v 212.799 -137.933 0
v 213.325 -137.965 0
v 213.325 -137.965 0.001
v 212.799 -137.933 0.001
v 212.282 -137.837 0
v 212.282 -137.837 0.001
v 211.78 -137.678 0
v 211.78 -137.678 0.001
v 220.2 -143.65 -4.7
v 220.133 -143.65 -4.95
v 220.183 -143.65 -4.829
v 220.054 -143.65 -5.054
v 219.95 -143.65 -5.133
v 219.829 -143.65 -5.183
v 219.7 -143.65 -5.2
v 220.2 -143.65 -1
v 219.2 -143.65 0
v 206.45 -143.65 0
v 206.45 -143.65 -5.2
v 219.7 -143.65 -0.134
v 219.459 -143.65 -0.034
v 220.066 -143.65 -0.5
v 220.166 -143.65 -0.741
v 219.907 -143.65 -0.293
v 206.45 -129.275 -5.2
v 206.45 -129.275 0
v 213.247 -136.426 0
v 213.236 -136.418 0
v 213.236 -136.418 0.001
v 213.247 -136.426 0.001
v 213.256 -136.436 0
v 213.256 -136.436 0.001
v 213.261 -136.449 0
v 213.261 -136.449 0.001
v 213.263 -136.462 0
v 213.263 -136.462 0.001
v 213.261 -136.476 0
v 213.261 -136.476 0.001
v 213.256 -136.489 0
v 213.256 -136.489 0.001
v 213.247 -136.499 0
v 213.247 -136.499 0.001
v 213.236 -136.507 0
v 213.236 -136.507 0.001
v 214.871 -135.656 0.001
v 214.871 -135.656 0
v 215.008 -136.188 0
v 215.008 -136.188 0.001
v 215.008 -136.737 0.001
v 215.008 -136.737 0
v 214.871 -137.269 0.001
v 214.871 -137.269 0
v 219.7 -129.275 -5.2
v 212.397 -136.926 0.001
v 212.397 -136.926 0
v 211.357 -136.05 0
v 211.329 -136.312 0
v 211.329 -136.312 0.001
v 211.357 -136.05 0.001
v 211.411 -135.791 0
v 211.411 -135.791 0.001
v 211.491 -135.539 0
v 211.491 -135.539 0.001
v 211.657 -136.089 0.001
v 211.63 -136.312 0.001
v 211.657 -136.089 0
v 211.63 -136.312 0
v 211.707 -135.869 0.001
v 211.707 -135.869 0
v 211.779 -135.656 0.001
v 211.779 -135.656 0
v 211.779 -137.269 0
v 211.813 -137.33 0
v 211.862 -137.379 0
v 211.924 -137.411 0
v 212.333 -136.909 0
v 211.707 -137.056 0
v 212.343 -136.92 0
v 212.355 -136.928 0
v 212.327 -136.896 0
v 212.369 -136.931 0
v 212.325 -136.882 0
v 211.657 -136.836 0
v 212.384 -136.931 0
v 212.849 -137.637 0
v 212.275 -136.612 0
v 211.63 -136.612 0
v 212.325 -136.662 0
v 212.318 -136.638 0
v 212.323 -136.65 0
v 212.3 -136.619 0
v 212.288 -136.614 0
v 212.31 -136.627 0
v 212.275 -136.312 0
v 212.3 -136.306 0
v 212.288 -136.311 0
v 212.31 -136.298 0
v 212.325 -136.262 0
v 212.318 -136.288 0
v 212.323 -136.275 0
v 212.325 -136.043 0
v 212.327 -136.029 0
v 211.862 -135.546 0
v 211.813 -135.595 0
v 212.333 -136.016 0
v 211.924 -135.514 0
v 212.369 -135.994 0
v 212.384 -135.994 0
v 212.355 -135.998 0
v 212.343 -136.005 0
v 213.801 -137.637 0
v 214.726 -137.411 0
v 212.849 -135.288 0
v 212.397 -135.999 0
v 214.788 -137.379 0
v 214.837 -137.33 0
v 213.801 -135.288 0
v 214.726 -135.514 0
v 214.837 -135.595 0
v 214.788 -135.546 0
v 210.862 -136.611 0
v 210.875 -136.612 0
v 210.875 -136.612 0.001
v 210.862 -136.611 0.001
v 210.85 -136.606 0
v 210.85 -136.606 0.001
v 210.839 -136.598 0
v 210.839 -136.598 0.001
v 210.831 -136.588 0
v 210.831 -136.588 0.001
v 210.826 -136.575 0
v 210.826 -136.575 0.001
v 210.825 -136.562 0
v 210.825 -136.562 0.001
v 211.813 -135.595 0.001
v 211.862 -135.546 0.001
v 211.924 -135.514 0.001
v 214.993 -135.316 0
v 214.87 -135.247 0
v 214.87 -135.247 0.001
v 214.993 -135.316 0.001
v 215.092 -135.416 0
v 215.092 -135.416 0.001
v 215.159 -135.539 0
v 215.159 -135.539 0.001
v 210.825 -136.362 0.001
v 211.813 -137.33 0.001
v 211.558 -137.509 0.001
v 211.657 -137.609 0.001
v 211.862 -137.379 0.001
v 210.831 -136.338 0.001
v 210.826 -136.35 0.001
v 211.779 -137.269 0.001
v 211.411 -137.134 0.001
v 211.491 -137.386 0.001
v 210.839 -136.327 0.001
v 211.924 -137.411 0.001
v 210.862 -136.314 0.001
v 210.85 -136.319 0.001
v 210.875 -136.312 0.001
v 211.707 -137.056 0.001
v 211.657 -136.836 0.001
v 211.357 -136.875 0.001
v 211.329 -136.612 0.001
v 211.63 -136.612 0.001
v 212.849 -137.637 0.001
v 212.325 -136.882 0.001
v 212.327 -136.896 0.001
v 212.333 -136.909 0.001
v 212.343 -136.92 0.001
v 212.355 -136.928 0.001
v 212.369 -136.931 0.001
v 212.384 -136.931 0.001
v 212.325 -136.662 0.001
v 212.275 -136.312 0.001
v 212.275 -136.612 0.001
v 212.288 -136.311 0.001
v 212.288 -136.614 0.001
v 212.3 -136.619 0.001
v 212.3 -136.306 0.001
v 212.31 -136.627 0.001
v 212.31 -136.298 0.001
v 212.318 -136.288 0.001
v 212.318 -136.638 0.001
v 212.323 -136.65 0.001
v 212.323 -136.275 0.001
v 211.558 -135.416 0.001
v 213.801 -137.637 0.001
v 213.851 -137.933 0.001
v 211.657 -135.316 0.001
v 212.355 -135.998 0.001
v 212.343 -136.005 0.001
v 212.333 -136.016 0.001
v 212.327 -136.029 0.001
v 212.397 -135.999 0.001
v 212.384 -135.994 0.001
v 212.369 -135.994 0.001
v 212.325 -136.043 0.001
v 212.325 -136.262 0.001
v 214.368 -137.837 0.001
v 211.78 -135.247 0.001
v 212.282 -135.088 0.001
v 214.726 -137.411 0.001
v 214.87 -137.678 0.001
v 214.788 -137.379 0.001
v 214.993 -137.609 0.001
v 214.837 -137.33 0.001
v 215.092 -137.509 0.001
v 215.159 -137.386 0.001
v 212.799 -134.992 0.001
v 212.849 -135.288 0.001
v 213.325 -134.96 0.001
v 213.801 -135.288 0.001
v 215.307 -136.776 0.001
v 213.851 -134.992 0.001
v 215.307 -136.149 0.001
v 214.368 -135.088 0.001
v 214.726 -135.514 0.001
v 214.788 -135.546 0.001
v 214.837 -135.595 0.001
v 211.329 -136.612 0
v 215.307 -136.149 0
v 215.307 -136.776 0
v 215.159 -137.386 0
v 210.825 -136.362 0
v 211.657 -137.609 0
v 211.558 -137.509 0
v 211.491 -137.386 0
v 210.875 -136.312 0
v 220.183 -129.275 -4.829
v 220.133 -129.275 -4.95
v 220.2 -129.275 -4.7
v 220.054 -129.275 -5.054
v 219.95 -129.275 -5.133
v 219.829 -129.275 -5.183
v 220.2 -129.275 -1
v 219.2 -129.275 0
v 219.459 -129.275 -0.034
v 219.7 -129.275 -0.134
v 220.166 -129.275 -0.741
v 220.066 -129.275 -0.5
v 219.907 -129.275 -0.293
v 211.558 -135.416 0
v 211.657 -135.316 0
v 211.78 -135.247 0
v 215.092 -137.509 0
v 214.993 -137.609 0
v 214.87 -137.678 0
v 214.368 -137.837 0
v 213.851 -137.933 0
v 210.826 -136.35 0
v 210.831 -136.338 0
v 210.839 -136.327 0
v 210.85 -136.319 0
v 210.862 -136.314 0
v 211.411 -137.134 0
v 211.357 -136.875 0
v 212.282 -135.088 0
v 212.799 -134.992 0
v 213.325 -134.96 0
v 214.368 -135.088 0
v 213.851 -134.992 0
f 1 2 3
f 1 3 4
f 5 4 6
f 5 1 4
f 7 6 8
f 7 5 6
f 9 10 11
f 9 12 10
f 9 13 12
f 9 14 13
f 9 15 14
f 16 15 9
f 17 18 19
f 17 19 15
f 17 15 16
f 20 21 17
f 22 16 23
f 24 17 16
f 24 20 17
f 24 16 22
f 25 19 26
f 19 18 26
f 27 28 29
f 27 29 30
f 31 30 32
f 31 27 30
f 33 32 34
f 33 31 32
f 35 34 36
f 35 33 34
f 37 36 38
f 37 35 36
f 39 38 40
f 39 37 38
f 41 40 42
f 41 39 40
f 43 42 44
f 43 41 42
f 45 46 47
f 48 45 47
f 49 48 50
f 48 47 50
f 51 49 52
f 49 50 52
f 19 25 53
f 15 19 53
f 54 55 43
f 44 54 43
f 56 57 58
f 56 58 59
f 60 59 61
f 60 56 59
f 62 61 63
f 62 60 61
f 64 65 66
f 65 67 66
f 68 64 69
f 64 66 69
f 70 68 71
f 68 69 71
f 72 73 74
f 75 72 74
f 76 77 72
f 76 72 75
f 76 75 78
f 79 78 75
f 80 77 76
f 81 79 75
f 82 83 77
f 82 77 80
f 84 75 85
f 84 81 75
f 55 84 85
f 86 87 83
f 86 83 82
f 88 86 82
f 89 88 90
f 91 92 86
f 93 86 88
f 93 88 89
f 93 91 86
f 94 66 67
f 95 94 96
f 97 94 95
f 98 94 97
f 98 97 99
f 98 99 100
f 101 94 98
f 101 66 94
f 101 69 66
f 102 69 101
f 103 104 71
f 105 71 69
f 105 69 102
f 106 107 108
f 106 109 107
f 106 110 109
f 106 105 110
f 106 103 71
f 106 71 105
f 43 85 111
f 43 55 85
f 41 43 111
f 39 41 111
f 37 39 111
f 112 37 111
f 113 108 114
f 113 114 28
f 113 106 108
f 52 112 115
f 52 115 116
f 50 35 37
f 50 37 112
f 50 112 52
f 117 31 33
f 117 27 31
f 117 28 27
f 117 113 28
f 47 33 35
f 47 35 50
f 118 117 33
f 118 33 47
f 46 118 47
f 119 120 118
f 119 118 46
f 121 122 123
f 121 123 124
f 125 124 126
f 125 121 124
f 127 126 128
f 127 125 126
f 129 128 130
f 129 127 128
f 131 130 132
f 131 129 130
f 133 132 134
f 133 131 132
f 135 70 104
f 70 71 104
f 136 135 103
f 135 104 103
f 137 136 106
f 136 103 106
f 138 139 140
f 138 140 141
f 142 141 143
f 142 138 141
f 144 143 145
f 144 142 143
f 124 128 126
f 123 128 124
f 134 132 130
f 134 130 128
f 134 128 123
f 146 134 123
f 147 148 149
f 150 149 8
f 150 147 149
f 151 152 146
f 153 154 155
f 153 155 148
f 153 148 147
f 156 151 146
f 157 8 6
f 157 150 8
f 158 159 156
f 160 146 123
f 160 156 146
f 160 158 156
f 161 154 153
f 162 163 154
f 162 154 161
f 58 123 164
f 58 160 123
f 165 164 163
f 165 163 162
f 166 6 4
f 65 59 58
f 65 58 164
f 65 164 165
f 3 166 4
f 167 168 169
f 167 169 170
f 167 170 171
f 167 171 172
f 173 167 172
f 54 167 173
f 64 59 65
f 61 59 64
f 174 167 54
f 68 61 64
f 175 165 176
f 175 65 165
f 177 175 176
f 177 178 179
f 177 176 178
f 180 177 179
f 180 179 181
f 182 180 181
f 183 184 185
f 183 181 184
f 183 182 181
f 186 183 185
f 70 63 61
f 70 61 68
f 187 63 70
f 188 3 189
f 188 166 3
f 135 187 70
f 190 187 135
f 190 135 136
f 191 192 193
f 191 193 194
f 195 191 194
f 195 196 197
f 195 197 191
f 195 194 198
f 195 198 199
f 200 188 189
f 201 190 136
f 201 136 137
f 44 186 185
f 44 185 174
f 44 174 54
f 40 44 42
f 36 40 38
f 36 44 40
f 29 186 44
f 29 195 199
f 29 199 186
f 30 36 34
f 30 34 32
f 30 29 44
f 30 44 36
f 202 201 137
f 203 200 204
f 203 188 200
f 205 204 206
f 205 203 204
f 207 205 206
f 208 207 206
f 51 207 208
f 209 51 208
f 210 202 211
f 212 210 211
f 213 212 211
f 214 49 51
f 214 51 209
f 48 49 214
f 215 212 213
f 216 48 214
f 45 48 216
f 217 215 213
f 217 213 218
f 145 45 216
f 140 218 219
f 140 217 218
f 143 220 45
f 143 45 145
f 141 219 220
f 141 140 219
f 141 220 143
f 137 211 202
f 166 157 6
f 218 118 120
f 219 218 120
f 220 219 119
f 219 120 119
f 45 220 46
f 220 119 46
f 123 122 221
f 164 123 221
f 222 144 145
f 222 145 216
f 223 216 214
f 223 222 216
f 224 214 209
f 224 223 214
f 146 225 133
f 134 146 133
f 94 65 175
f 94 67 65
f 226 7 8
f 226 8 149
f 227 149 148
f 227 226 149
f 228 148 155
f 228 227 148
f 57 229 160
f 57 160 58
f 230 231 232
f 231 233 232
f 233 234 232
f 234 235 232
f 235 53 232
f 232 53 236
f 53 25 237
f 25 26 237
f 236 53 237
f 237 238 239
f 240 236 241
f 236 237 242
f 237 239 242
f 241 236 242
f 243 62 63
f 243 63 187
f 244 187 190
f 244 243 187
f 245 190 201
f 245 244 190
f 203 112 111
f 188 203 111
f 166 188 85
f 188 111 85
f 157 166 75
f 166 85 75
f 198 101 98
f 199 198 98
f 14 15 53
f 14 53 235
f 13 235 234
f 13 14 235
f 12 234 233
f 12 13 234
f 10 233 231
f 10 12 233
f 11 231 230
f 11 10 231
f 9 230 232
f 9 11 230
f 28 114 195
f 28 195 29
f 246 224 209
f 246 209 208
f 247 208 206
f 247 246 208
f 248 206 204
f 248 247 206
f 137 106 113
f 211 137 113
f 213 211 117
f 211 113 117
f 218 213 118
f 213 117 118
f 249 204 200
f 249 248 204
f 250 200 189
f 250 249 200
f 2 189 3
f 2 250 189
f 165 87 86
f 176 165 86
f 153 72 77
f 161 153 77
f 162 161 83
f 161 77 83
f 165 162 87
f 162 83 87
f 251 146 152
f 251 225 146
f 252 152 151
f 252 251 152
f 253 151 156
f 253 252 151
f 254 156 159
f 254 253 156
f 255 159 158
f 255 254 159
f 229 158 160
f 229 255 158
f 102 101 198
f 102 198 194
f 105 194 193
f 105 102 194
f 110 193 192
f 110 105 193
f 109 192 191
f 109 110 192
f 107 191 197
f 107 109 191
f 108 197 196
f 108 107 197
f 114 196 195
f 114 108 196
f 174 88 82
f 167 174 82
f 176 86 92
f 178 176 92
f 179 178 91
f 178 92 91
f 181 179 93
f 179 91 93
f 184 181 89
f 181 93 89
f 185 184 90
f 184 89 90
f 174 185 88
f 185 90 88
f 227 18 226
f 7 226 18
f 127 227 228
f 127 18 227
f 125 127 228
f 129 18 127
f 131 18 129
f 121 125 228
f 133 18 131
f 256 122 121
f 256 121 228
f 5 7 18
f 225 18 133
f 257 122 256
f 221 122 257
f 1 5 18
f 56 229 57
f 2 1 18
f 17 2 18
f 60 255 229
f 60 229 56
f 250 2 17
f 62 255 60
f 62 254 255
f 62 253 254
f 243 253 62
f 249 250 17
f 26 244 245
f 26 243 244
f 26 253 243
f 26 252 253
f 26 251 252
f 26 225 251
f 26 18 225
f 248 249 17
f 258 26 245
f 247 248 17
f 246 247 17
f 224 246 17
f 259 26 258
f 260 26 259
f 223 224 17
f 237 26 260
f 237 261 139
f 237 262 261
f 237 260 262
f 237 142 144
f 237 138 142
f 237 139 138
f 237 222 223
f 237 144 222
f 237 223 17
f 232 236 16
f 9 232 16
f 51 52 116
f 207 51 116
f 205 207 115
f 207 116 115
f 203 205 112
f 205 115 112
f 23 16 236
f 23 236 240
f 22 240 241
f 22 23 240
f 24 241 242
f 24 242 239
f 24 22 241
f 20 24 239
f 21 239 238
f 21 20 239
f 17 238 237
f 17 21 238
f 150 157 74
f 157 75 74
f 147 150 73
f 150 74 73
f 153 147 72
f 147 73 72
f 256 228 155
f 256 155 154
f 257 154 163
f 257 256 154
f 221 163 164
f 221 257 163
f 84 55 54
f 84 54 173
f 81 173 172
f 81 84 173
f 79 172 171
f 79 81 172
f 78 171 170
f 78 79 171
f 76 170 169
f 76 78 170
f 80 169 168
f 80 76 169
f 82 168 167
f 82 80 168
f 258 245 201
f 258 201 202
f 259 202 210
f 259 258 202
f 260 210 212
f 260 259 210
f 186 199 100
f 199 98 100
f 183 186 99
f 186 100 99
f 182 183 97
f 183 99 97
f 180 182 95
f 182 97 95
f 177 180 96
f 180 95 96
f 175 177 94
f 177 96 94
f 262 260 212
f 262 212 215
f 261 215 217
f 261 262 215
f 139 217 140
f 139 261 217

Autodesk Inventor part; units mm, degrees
ref_plane "YZ Plane" through (0, 0, 0) normal (1, 0, 0) x (0, 1, 0)
ref_plane "XZ Plane" through (0, 0, 0) normal (0, 1, 0) x (-1, 0, 0)
ref_plane "XY Plane" through (0, 0, 0) normal (0, 0, 1) x (1, 0, 0)
sketch "Szkic1" plane through (0, 0, 0) normal (0, 0, 1) x (1, 0, 0)
  line L0 (206.45, -143.65) -> (206.45, -129.275)
  line L1 (206.45, -129.275) -> (220.2, -129.275)
  line L2 (206.45, -143.65) -> (220.2, -143.65)
  line L3 (220.2, -129.275) -> (220.2, -143.65)
extrude "Wyciągnięcie proste1" add sketch "Szkic1" against normal blind 5.2
fillet "Zaokrąglenie1" radius 0.5 1 edges at (220.2, -136.4625, -5.2)
sketch "Szkic6" plane through (0, 0, 0) normal (0, 0, 1) x (1, 0, 0)
  arc A0 (214.7263, -135.514) -> (211.9237, -135.514) centre (213.325, -139.2478) ccw
  arc A1 (211.9237, -137.411) -> (214.7263, -137.411) centre (213.325, -133.6772) ccw
  arc A2 (214.8708, -137.2693) -> (214.8708, -135.6557) centre (212.8406, -136.4625) ccw
  arc A3 (211.9237, -135.514) -> (211.7792, -135.6557) centre (212.0023, -135.7386) ccw
  arc A4 (211.7792, -137.2693) -> (211.9237, -137.411) centre (212.0023, -137.1864) ccw
  arc A5 (214.8708, -135.6557) -> (214.7263, -135.514) centre (214.6477, -135.7386) ccw
  arc A6 (214.7263, -137.411) -> (214.8708, -137.2693) centre (214.6477, -137.1864) ccw
  arc A7 (213.325, -134.9597) -> (211.7797, -135.2472) centre (213.3235, -139.2481) ccw
  arc A8 (211.7797, -135.2472) -> (211.4912, -135.5391) centre (211.9597, -135.7137) ccw
  arc A9 (211.7797, -137.6778) -> (213.325, -137.9653) centre (213.3235, -133.6769) ccw
  arc A10 (211.4912, -137.3859) -> (211.7797, -137.6778) centre (211.9597, -137.2113) ccw
  arc A11 (213.325, -137.9653) -> (214.8703, -137.6778) centre (213.3265, -133.6769) ccw
  arc A12 (214.8703, -137.6778) -> (215.1588, -137.3859) centre (214.6903, -137.2113) ccw
  arc A13 (214.8703, -135.2472) -> (213.325, -134.9597) centre (213.3265, -139.2481) ccw
  arc A14 (215.1588, -135.5391) -> (214.8703, -135.2472) centre (214.6903, -135.7137) ccw
  arc A15 (215.1588, -137.3859) -> (215.1588, -135.5391) centre (212.6802, -136.4625) ccw
  line L0 (206.45, -143.65) -> (206.45, -129.275) projected
  line L1 (206.45, -129.275) -> (220.2, -129.275) projected
  line L2 (210.8247, -136.3625) -> (210.8247, -136.5625)
  line L3 (212.3974, -135.9987) -> (213.2356, -136.4178)
  line L4 (212.3974, -136.9263) -> (213.2356, -136.5072)
  line L5 (212.325, -136.0434) -> (212.325, -136.2625)
  line L6 (212.325, -136.6625) -> (212.325, -136.8816)
  arc A16 (212.3974, -135.9987) -> (212.325, -136.0434) centre (212.375, -136.0434) ccw
  arc A17 (212.325, -136.8816) -> (212.3974, -136.9263) centre (212.375, -136.8816) ccw
  arc A18 (213.2356, -136.5072) -> (213.2356, -136.4178) centre (213.2132, -136.4625) ccw
  arc A19 (210.8747, -136.3125) -> (210.8247, -136.3625) centre (210.8747, -136.3625) ccw
  arc A20 (210.8247, -136.5625) -> (210.8747, -136.6125) centre (210.8747, -136.5625) ccw
  arc A21 (212.275, -136.3125) -> (212.325, -136.2625) centre (212.275, -136.2625) ccw
  arc A22 (212.325, -136.6625) -> (212.275, -136.6125) centre (212.275, -136.6625) ccw
  arc A23 (211.7792, -135.6557) -> (211.6299, -136.3125) centre (213.8094, -136.4625) ccw
  arc A24 (211.6299, -136.6125) -> (211.7792, -137.2693) centre (213.8094, -136.4625) ccw
  arc A25 (211.4912, -135.5391) -> (211.329, -136.3125) centre (213.9698, -136.4625) ccw
  arc A26 (211.329, -136.6125) -> (211.4912, -137.3859) centre (213.9698, -136.4625) ccw
  line L7 (210.8747, -136.3125) -> (211.329, -136.3125)
  line L8 (211.6299, -136.3125) -> (212.275, -136.3125)
  line L9 (210.8747, -136.6125) -> (211.329, -136.6125)
  line L10 (211.6299, -136.6125) -> (212.275, -136.6125)
  point P0 (206.45, -136.4625)
  point P1 (213.325, -129.275)
  point P2 (210.8247, -136.3125)
  point P3 (210.8247, -136.6125)
  point P4 (212.325, -135.9625)
  point P5 (212.325, -136.9625)
  dimension "d70" = 0.3
  dimension "d75" = 1
  dimension "d78" = 0.05
fillet "Zaokrąglenie2" radius 1 1 edges at (220.2, -136.4625, 0)
extrude "Wyciągnięcie proste5" add sketch "Szkic6" along normal blind 0.001
properties part number "PRZYCISK IO" material "Tworzywo sztuczne, nieprzezroczyste czarne"
